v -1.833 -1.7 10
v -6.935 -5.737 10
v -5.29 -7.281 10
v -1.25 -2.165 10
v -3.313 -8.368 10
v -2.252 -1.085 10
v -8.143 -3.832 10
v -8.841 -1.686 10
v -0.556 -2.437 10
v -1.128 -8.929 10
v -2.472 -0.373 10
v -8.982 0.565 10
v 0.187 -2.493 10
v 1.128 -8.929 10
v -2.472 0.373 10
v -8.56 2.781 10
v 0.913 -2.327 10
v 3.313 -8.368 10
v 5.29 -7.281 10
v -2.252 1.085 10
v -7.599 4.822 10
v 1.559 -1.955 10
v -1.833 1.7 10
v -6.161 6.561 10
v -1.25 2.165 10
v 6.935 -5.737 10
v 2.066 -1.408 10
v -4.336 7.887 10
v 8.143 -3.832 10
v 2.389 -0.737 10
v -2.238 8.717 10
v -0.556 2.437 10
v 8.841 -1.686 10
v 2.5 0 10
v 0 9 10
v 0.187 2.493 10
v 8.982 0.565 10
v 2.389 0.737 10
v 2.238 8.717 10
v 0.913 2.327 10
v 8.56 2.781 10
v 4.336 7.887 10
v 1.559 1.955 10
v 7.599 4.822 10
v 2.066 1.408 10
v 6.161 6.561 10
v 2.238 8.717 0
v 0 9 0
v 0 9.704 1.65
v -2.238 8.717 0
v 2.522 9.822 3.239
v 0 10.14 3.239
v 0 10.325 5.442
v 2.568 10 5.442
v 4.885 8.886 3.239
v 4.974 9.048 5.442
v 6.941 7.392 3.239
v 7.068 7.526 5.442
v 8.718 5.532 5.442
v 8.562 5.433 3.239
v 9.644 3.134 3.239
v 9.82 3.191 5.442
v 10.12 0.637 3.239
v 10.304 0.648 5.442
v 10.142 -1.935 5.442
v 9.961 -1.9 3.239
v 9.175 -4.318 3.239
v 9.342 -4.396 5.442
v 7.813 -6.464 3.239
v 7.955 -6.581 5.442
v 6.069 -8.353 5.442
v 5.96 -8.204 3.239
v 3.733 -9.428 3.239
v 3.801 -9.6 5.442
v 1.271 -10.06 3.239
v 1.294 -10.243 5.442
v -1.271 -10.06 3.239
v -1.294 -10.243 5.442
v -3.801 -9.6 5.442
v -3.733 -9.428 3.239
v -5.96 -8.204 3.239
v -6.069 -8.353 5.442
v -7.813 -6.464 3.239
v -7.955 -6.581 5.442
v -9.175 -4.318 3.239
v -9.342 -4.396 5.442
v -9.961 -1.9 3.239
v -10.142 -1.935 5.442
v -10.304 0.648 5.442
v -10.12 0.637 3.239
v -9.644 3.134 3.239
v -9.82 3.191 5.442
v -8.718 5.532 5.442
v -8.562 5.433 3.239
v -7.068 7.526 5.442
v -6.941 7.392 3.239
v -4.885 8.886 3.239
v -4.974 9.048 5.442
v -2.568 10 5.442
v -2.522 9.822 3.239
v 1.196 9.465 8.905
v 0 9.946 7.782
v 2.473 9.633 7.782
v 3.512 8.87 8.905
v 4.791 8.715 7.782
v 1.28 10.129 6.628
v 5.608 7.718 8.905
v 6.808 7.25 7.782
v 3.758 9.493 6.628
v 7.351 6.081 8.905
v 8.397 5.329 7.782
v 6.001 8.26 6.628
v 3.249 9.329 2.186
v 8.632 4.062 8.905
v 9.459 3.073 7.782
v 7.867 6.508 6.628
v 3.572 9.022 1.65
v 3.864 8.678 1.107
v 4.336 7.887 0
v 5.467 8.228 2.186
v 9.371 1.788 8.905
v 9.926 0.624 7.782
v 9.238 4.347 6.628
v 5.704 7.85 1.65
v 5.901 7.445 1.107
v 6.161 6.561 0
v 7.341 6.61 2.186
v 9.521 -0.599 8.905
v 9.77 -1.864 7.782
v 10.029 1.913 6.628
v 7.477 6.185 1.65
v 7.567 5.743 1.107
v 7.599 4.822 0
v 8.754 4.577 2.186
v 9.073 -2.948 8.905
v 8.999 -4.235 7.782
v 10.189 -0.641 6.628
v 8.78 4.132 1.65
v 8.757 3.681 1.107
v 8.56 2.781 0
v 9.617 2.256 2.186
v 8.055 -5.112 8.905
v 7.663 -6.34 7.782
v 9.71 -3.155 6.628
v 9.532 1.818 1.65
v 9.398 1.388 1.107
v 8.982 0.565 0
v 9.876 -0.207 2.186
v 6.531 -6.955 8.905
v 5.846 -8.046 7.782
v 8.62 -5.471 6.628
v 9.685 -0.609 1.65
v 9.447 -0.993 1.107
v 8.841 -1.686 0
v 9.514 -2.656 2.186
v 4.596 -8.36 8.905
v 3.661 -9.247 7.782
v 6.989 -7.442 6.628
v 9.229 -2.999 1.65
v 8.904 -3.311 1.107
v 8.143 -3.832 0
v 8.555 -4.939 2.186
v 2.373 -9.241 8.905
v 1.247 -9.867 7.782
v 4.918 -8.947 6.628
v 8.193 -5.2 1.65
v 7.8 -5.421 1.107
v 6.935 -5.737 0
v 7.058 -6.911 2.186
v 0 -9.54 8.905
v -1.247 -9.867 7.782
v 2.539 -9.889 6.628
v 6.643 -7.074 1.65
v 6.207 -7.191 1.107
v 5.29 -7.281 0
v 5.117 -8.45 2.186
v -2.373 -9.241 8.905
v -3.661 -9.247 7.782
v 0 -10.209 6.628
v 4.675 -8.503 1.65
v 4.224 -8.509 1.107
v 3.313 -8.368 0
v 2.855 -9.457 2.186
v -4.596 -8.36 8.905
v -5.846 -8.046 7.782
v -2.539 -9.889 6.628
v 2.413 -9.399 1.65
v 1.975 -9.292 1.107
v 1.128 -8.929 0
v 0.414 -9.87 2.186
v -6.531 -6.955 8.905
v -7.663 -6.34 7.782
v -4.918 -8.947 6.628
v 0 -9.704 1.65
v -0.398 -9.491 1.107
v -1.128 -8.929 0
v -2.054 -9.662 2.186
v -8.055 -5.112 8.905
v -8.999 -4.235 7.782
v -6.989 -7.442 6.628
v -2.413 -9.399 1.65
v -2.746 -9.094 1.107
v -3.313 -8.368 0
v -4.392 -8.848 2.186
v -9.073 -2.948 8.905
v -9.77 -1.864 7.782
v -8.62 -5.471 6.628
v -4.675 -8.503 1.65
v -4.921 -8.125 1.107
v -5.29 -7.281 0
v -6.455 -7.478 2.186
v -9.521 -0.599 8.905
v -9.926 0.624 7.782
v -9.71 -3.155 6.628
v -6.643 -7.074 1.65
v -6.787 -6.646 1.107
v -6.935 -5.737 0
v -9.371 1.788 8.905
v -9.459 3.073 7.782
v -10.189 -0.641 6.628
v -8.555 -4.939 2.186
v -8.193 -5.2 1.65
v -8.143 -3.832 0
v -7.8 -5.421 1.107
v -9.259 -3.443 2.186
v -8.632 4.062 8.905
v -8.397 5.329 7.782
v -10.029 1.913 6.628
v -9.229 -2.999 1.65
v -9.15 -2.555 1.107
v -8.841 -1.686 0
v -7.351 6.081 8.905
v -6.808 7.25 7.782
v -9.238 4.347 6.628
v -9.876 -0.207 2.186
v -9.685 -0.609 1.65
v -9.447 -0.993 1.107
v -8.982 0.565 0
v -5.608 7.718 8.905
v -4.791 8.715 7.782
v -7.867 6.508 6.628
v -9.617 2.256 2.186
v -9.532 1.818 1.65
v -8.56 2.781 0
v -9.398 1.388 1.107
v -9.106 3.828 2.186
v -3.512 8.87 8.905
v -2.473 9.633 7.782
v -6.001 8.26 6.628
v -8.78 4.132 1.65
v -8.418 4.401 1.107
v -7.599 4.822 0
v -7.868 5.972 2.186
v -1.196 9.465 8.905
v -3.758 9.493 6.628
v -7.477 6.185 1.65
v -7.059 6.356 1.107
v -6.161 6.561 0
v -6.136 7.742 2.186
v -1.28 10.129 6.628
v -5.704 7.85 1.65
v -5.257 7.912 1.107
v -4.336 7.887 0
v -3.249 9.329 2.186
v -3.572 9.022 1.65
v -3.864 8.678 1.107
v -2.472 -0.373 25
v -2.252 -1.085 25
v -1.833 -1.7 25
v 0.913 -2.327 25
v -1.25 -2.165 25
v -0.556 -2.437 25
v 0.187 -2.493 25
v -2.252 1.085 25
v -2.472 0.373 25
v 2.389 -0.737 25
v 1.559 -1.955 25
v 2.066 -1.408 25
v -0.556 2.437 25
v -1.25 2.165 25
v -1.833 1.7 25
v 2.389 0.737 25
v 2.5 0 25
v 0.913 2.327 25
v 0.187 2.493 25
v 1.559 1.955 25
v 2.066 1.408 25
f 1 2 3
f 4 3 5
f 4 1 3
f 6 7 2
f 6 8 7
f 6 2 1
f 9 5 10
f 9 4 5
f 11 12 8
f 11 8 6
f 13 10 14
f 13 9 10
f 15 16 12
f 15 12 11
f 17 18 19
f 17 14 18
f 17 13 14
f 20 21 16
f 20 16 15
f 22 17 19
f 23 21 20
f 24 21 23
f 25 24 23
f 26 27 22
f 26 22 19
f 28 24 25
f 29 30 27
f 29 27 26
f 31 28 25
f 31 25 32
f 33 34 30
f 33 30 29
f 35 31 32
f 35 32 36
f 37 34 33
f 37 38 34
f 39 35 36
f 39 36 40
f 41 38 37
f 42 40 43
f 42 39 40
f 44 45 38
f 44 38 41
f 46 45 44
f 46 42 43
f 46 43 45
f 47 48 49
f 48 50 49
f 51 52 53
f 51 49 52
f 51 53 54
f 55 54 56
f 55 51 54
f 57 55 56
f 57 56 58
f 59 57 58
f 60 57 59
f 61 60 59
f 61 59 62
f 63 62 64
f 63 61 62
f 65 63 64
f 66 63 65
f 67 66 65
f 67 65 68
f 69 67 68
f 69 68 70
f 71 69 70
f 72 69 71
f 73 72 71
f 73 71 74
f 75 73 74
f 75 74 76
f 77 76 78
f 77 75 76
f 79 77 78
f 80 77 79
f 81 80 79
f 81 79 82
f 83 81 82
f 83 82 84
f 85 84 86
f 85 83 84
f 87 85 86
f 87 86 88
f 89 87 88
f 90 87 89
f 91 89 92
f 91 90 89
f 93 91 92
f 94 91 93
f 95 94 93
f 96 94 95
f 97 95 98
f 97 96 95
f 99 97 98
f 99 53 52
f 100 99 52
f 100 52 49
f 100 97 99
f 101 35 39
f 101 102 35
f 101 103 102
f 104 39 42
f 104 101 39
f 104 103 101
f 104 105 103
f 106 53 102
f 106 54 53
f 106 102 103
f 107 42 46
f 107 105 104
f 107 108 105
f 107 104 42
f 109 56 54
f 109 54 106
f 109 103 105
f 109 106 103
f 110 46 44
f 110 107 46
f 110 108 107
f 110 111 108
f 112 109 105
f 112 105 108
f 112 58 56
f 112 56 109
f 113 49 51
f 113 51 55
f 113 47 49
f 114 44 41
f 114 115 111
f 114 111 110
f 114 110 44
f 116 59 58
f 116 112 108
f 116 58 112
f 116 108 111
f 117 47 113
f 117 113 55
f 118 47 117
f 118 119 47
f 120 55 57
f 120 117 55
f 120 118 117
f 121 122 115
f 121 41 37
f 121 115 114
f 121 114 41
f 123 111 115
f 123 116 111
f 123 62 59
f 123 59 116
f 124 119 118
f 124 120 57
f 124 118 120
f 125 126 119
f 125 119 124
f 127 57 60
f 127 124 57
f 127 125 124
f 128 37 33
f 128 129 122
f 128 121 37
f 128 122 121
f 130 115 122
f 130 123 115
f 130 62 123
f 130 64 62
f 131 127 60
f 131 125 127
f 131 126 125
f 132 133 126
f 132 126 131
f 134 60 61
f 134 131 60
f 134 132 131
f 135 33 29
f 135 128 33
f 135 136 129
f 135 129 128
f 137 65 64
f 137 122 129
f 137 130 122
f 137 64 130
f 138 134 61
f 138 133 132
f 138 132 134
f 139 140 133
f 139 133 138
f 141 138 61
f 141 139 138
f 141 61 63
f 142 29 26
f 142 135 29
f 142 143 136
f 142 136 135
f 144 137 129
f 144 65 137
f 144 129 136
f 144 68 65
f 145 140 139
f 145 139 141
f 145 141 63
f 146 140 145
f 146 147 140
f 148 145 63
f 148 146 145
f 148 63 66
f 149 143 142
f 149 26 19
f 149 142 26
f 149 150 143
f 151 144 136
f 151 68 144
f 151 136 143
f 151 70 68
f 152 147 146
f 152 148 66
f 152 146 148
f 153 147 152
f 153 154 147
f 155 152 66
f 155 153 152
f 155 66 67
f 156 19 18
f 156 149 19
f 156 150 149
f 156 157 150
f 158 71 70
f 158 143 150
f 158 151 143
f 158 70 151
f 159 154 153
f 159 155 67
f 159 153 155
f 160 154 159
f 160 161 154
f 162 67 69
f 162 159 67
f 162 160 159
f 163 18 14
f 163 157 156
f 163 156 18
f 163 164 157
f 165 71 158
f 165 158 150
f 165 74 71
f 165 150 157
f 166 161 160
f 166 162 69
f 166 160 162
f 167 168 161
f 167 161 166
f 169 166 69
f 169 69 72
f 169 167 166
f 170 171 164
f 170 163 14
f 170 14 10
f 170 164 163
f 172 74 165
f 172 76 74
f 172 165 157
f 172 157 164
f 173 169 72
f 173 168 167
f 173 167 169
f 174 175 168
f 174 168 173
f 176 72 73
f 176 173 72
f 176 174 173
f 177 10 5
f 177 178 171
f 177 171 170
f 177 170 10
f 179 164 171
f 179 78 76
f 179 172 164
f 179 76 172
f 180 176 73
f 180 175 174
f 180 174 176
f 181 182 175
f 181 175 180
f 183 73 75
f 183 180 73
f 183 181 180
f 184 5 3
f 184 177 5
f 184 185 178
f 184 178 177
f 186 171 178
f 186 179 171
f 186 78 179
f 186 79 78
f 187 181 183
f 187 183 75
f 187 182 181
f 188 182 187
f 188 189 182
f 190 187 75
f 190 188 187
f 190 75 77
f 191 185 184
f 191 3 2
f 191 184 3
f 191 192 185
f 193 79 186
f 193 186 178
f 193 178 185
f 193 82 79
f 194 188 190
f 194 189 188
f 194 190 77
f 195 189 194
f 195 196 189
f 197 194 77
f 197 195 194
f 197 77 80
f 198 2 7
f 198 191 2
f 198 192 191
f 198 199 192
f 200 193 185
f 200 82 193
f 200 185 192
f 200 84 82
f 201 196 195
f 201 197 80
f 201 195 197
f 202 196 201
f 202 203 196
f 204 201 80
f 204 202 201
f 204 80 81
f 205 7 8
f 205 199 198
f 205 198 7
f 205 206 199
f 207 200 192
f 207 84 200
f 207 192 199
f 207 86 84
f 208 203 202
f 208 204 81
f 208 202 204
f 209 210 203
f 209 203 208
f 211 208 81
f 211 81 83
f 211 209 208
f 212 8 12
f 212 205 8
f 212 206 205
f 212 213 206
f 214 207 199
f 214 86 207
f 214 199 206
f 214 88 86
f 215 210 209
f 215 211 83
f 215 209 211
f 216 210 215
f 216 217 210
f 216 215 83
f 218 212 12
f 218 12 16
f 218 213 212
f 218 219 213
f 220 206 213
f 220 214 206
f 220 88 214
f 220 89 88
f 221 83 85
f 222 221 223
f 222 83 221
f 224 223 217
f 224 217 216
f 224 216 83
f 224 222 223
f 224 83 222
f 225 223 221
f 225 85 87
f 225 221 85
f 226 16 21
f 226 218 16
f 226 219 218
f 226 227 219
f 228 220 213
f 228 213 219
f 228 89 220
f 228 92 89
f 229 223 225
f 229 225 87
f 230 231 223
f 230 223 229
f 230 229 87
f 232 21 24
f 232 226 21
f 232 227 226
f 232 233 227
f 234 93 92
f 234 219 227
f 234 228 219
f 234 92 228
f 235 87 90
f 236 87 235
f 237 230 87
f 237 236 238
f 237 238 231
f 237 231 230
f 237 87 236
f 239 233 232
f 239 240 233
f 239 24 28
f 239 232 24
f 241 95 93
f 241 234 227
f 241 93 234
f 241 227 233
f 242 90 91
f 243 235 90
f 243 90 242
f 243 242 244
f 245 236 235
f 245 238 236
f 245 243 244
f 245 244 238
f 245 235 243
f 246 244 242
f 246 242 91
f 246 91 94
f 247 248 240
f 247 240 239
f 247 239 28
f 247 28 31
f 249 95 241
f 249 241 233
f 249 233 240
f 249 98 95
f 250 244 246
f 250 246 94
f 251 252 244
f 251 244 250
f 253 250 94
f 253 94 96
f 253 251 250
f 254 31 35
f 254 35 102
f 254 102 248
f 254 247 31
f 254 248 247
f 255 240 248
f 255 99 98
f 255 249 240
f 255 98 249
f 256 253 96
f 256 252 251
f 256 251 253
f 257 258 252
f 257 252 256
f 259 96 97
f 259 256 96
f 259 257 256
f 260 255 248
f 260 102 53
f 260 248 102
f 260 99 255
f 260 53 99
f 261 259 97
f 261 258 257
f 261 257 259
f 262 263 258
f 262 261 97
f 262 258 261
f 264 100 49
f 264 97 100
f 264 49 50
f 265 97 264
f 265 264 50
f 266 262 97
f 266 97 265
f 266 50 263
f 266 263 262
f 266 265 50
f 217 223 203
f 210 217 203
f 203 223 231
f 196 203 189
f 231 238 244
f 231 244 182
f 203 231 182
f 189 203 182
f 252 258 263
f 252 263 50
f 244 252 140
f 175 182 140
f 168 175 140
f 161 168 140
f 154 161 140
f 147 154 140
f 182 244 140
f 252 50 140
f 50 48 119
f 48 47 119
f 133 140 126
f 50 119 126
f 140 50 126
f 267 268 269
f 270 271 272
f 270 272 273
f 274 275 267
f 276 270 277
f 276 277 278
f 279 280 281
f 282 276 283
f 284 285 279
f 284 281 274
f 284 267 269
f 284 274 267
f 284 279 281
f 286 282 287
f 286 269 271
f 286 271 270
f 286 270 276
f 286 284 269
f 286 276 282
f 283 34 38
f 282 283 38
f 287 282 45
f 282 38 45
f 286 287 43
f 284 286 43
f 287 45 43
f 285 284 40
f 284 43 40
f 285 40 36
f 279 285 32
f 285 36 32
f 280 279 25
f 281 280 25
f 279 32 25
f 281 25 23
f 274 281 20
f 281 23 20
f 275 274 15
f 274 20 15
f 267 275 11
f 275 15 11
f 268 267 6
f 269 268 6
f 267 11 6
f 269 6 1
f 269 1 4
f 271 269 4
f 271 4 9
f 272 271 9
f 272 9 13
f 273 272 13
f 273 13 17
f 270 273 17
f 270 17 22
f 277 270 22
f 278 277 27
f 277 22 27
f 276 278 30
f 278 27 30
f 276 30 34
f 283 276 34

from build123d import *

# Parameters (mm, degrees)
SKETCH1_R           = 9
BOSS_EXTRUDE1_DEPTH = 10
SKETCH3_R           = 2.5
BOSS_EXTRUDE2_DEPTH = 15


with BuildPart() as part:
    # Sketch1 → Boss-Extrude1 (new body)
    with BuildSketch(Plane.XY):
        Circle(SKETCH1_R)
    extrude(amount=BOSS_EXTRUDE1_DEPTH)

    # Sketch2 → Revolve1 (revolve)
    with BuildSketch(Plane(origin=(0, 0, 0), x_dir=(0, 0, -1), z_dir=(1, 0, 0))):
        with BuildLine():
            Line((-10, 9), (0, 9))
            add(Edge.make_bspline(
                [(-10, 9), (-7.025299732, 10.664982645), (-3.75093179, 10.87766674), (0, 9)],
                knots=[0, 0, 0, 0, 1, 1, 1, 1], degree=3))
        make_face()
    revolve(axis=Axis((0, 0, 17.888498858), (0, 0, -1)))

    # Sketch3 → Boss-Extrude2 (add)
    with BuildSketch(Plane.XY.offset(10)):
        Circle(SKETCH3_R)
    extrude(amount=BOSS_EXTRUDE2_DEPTH)


solid = part.part
